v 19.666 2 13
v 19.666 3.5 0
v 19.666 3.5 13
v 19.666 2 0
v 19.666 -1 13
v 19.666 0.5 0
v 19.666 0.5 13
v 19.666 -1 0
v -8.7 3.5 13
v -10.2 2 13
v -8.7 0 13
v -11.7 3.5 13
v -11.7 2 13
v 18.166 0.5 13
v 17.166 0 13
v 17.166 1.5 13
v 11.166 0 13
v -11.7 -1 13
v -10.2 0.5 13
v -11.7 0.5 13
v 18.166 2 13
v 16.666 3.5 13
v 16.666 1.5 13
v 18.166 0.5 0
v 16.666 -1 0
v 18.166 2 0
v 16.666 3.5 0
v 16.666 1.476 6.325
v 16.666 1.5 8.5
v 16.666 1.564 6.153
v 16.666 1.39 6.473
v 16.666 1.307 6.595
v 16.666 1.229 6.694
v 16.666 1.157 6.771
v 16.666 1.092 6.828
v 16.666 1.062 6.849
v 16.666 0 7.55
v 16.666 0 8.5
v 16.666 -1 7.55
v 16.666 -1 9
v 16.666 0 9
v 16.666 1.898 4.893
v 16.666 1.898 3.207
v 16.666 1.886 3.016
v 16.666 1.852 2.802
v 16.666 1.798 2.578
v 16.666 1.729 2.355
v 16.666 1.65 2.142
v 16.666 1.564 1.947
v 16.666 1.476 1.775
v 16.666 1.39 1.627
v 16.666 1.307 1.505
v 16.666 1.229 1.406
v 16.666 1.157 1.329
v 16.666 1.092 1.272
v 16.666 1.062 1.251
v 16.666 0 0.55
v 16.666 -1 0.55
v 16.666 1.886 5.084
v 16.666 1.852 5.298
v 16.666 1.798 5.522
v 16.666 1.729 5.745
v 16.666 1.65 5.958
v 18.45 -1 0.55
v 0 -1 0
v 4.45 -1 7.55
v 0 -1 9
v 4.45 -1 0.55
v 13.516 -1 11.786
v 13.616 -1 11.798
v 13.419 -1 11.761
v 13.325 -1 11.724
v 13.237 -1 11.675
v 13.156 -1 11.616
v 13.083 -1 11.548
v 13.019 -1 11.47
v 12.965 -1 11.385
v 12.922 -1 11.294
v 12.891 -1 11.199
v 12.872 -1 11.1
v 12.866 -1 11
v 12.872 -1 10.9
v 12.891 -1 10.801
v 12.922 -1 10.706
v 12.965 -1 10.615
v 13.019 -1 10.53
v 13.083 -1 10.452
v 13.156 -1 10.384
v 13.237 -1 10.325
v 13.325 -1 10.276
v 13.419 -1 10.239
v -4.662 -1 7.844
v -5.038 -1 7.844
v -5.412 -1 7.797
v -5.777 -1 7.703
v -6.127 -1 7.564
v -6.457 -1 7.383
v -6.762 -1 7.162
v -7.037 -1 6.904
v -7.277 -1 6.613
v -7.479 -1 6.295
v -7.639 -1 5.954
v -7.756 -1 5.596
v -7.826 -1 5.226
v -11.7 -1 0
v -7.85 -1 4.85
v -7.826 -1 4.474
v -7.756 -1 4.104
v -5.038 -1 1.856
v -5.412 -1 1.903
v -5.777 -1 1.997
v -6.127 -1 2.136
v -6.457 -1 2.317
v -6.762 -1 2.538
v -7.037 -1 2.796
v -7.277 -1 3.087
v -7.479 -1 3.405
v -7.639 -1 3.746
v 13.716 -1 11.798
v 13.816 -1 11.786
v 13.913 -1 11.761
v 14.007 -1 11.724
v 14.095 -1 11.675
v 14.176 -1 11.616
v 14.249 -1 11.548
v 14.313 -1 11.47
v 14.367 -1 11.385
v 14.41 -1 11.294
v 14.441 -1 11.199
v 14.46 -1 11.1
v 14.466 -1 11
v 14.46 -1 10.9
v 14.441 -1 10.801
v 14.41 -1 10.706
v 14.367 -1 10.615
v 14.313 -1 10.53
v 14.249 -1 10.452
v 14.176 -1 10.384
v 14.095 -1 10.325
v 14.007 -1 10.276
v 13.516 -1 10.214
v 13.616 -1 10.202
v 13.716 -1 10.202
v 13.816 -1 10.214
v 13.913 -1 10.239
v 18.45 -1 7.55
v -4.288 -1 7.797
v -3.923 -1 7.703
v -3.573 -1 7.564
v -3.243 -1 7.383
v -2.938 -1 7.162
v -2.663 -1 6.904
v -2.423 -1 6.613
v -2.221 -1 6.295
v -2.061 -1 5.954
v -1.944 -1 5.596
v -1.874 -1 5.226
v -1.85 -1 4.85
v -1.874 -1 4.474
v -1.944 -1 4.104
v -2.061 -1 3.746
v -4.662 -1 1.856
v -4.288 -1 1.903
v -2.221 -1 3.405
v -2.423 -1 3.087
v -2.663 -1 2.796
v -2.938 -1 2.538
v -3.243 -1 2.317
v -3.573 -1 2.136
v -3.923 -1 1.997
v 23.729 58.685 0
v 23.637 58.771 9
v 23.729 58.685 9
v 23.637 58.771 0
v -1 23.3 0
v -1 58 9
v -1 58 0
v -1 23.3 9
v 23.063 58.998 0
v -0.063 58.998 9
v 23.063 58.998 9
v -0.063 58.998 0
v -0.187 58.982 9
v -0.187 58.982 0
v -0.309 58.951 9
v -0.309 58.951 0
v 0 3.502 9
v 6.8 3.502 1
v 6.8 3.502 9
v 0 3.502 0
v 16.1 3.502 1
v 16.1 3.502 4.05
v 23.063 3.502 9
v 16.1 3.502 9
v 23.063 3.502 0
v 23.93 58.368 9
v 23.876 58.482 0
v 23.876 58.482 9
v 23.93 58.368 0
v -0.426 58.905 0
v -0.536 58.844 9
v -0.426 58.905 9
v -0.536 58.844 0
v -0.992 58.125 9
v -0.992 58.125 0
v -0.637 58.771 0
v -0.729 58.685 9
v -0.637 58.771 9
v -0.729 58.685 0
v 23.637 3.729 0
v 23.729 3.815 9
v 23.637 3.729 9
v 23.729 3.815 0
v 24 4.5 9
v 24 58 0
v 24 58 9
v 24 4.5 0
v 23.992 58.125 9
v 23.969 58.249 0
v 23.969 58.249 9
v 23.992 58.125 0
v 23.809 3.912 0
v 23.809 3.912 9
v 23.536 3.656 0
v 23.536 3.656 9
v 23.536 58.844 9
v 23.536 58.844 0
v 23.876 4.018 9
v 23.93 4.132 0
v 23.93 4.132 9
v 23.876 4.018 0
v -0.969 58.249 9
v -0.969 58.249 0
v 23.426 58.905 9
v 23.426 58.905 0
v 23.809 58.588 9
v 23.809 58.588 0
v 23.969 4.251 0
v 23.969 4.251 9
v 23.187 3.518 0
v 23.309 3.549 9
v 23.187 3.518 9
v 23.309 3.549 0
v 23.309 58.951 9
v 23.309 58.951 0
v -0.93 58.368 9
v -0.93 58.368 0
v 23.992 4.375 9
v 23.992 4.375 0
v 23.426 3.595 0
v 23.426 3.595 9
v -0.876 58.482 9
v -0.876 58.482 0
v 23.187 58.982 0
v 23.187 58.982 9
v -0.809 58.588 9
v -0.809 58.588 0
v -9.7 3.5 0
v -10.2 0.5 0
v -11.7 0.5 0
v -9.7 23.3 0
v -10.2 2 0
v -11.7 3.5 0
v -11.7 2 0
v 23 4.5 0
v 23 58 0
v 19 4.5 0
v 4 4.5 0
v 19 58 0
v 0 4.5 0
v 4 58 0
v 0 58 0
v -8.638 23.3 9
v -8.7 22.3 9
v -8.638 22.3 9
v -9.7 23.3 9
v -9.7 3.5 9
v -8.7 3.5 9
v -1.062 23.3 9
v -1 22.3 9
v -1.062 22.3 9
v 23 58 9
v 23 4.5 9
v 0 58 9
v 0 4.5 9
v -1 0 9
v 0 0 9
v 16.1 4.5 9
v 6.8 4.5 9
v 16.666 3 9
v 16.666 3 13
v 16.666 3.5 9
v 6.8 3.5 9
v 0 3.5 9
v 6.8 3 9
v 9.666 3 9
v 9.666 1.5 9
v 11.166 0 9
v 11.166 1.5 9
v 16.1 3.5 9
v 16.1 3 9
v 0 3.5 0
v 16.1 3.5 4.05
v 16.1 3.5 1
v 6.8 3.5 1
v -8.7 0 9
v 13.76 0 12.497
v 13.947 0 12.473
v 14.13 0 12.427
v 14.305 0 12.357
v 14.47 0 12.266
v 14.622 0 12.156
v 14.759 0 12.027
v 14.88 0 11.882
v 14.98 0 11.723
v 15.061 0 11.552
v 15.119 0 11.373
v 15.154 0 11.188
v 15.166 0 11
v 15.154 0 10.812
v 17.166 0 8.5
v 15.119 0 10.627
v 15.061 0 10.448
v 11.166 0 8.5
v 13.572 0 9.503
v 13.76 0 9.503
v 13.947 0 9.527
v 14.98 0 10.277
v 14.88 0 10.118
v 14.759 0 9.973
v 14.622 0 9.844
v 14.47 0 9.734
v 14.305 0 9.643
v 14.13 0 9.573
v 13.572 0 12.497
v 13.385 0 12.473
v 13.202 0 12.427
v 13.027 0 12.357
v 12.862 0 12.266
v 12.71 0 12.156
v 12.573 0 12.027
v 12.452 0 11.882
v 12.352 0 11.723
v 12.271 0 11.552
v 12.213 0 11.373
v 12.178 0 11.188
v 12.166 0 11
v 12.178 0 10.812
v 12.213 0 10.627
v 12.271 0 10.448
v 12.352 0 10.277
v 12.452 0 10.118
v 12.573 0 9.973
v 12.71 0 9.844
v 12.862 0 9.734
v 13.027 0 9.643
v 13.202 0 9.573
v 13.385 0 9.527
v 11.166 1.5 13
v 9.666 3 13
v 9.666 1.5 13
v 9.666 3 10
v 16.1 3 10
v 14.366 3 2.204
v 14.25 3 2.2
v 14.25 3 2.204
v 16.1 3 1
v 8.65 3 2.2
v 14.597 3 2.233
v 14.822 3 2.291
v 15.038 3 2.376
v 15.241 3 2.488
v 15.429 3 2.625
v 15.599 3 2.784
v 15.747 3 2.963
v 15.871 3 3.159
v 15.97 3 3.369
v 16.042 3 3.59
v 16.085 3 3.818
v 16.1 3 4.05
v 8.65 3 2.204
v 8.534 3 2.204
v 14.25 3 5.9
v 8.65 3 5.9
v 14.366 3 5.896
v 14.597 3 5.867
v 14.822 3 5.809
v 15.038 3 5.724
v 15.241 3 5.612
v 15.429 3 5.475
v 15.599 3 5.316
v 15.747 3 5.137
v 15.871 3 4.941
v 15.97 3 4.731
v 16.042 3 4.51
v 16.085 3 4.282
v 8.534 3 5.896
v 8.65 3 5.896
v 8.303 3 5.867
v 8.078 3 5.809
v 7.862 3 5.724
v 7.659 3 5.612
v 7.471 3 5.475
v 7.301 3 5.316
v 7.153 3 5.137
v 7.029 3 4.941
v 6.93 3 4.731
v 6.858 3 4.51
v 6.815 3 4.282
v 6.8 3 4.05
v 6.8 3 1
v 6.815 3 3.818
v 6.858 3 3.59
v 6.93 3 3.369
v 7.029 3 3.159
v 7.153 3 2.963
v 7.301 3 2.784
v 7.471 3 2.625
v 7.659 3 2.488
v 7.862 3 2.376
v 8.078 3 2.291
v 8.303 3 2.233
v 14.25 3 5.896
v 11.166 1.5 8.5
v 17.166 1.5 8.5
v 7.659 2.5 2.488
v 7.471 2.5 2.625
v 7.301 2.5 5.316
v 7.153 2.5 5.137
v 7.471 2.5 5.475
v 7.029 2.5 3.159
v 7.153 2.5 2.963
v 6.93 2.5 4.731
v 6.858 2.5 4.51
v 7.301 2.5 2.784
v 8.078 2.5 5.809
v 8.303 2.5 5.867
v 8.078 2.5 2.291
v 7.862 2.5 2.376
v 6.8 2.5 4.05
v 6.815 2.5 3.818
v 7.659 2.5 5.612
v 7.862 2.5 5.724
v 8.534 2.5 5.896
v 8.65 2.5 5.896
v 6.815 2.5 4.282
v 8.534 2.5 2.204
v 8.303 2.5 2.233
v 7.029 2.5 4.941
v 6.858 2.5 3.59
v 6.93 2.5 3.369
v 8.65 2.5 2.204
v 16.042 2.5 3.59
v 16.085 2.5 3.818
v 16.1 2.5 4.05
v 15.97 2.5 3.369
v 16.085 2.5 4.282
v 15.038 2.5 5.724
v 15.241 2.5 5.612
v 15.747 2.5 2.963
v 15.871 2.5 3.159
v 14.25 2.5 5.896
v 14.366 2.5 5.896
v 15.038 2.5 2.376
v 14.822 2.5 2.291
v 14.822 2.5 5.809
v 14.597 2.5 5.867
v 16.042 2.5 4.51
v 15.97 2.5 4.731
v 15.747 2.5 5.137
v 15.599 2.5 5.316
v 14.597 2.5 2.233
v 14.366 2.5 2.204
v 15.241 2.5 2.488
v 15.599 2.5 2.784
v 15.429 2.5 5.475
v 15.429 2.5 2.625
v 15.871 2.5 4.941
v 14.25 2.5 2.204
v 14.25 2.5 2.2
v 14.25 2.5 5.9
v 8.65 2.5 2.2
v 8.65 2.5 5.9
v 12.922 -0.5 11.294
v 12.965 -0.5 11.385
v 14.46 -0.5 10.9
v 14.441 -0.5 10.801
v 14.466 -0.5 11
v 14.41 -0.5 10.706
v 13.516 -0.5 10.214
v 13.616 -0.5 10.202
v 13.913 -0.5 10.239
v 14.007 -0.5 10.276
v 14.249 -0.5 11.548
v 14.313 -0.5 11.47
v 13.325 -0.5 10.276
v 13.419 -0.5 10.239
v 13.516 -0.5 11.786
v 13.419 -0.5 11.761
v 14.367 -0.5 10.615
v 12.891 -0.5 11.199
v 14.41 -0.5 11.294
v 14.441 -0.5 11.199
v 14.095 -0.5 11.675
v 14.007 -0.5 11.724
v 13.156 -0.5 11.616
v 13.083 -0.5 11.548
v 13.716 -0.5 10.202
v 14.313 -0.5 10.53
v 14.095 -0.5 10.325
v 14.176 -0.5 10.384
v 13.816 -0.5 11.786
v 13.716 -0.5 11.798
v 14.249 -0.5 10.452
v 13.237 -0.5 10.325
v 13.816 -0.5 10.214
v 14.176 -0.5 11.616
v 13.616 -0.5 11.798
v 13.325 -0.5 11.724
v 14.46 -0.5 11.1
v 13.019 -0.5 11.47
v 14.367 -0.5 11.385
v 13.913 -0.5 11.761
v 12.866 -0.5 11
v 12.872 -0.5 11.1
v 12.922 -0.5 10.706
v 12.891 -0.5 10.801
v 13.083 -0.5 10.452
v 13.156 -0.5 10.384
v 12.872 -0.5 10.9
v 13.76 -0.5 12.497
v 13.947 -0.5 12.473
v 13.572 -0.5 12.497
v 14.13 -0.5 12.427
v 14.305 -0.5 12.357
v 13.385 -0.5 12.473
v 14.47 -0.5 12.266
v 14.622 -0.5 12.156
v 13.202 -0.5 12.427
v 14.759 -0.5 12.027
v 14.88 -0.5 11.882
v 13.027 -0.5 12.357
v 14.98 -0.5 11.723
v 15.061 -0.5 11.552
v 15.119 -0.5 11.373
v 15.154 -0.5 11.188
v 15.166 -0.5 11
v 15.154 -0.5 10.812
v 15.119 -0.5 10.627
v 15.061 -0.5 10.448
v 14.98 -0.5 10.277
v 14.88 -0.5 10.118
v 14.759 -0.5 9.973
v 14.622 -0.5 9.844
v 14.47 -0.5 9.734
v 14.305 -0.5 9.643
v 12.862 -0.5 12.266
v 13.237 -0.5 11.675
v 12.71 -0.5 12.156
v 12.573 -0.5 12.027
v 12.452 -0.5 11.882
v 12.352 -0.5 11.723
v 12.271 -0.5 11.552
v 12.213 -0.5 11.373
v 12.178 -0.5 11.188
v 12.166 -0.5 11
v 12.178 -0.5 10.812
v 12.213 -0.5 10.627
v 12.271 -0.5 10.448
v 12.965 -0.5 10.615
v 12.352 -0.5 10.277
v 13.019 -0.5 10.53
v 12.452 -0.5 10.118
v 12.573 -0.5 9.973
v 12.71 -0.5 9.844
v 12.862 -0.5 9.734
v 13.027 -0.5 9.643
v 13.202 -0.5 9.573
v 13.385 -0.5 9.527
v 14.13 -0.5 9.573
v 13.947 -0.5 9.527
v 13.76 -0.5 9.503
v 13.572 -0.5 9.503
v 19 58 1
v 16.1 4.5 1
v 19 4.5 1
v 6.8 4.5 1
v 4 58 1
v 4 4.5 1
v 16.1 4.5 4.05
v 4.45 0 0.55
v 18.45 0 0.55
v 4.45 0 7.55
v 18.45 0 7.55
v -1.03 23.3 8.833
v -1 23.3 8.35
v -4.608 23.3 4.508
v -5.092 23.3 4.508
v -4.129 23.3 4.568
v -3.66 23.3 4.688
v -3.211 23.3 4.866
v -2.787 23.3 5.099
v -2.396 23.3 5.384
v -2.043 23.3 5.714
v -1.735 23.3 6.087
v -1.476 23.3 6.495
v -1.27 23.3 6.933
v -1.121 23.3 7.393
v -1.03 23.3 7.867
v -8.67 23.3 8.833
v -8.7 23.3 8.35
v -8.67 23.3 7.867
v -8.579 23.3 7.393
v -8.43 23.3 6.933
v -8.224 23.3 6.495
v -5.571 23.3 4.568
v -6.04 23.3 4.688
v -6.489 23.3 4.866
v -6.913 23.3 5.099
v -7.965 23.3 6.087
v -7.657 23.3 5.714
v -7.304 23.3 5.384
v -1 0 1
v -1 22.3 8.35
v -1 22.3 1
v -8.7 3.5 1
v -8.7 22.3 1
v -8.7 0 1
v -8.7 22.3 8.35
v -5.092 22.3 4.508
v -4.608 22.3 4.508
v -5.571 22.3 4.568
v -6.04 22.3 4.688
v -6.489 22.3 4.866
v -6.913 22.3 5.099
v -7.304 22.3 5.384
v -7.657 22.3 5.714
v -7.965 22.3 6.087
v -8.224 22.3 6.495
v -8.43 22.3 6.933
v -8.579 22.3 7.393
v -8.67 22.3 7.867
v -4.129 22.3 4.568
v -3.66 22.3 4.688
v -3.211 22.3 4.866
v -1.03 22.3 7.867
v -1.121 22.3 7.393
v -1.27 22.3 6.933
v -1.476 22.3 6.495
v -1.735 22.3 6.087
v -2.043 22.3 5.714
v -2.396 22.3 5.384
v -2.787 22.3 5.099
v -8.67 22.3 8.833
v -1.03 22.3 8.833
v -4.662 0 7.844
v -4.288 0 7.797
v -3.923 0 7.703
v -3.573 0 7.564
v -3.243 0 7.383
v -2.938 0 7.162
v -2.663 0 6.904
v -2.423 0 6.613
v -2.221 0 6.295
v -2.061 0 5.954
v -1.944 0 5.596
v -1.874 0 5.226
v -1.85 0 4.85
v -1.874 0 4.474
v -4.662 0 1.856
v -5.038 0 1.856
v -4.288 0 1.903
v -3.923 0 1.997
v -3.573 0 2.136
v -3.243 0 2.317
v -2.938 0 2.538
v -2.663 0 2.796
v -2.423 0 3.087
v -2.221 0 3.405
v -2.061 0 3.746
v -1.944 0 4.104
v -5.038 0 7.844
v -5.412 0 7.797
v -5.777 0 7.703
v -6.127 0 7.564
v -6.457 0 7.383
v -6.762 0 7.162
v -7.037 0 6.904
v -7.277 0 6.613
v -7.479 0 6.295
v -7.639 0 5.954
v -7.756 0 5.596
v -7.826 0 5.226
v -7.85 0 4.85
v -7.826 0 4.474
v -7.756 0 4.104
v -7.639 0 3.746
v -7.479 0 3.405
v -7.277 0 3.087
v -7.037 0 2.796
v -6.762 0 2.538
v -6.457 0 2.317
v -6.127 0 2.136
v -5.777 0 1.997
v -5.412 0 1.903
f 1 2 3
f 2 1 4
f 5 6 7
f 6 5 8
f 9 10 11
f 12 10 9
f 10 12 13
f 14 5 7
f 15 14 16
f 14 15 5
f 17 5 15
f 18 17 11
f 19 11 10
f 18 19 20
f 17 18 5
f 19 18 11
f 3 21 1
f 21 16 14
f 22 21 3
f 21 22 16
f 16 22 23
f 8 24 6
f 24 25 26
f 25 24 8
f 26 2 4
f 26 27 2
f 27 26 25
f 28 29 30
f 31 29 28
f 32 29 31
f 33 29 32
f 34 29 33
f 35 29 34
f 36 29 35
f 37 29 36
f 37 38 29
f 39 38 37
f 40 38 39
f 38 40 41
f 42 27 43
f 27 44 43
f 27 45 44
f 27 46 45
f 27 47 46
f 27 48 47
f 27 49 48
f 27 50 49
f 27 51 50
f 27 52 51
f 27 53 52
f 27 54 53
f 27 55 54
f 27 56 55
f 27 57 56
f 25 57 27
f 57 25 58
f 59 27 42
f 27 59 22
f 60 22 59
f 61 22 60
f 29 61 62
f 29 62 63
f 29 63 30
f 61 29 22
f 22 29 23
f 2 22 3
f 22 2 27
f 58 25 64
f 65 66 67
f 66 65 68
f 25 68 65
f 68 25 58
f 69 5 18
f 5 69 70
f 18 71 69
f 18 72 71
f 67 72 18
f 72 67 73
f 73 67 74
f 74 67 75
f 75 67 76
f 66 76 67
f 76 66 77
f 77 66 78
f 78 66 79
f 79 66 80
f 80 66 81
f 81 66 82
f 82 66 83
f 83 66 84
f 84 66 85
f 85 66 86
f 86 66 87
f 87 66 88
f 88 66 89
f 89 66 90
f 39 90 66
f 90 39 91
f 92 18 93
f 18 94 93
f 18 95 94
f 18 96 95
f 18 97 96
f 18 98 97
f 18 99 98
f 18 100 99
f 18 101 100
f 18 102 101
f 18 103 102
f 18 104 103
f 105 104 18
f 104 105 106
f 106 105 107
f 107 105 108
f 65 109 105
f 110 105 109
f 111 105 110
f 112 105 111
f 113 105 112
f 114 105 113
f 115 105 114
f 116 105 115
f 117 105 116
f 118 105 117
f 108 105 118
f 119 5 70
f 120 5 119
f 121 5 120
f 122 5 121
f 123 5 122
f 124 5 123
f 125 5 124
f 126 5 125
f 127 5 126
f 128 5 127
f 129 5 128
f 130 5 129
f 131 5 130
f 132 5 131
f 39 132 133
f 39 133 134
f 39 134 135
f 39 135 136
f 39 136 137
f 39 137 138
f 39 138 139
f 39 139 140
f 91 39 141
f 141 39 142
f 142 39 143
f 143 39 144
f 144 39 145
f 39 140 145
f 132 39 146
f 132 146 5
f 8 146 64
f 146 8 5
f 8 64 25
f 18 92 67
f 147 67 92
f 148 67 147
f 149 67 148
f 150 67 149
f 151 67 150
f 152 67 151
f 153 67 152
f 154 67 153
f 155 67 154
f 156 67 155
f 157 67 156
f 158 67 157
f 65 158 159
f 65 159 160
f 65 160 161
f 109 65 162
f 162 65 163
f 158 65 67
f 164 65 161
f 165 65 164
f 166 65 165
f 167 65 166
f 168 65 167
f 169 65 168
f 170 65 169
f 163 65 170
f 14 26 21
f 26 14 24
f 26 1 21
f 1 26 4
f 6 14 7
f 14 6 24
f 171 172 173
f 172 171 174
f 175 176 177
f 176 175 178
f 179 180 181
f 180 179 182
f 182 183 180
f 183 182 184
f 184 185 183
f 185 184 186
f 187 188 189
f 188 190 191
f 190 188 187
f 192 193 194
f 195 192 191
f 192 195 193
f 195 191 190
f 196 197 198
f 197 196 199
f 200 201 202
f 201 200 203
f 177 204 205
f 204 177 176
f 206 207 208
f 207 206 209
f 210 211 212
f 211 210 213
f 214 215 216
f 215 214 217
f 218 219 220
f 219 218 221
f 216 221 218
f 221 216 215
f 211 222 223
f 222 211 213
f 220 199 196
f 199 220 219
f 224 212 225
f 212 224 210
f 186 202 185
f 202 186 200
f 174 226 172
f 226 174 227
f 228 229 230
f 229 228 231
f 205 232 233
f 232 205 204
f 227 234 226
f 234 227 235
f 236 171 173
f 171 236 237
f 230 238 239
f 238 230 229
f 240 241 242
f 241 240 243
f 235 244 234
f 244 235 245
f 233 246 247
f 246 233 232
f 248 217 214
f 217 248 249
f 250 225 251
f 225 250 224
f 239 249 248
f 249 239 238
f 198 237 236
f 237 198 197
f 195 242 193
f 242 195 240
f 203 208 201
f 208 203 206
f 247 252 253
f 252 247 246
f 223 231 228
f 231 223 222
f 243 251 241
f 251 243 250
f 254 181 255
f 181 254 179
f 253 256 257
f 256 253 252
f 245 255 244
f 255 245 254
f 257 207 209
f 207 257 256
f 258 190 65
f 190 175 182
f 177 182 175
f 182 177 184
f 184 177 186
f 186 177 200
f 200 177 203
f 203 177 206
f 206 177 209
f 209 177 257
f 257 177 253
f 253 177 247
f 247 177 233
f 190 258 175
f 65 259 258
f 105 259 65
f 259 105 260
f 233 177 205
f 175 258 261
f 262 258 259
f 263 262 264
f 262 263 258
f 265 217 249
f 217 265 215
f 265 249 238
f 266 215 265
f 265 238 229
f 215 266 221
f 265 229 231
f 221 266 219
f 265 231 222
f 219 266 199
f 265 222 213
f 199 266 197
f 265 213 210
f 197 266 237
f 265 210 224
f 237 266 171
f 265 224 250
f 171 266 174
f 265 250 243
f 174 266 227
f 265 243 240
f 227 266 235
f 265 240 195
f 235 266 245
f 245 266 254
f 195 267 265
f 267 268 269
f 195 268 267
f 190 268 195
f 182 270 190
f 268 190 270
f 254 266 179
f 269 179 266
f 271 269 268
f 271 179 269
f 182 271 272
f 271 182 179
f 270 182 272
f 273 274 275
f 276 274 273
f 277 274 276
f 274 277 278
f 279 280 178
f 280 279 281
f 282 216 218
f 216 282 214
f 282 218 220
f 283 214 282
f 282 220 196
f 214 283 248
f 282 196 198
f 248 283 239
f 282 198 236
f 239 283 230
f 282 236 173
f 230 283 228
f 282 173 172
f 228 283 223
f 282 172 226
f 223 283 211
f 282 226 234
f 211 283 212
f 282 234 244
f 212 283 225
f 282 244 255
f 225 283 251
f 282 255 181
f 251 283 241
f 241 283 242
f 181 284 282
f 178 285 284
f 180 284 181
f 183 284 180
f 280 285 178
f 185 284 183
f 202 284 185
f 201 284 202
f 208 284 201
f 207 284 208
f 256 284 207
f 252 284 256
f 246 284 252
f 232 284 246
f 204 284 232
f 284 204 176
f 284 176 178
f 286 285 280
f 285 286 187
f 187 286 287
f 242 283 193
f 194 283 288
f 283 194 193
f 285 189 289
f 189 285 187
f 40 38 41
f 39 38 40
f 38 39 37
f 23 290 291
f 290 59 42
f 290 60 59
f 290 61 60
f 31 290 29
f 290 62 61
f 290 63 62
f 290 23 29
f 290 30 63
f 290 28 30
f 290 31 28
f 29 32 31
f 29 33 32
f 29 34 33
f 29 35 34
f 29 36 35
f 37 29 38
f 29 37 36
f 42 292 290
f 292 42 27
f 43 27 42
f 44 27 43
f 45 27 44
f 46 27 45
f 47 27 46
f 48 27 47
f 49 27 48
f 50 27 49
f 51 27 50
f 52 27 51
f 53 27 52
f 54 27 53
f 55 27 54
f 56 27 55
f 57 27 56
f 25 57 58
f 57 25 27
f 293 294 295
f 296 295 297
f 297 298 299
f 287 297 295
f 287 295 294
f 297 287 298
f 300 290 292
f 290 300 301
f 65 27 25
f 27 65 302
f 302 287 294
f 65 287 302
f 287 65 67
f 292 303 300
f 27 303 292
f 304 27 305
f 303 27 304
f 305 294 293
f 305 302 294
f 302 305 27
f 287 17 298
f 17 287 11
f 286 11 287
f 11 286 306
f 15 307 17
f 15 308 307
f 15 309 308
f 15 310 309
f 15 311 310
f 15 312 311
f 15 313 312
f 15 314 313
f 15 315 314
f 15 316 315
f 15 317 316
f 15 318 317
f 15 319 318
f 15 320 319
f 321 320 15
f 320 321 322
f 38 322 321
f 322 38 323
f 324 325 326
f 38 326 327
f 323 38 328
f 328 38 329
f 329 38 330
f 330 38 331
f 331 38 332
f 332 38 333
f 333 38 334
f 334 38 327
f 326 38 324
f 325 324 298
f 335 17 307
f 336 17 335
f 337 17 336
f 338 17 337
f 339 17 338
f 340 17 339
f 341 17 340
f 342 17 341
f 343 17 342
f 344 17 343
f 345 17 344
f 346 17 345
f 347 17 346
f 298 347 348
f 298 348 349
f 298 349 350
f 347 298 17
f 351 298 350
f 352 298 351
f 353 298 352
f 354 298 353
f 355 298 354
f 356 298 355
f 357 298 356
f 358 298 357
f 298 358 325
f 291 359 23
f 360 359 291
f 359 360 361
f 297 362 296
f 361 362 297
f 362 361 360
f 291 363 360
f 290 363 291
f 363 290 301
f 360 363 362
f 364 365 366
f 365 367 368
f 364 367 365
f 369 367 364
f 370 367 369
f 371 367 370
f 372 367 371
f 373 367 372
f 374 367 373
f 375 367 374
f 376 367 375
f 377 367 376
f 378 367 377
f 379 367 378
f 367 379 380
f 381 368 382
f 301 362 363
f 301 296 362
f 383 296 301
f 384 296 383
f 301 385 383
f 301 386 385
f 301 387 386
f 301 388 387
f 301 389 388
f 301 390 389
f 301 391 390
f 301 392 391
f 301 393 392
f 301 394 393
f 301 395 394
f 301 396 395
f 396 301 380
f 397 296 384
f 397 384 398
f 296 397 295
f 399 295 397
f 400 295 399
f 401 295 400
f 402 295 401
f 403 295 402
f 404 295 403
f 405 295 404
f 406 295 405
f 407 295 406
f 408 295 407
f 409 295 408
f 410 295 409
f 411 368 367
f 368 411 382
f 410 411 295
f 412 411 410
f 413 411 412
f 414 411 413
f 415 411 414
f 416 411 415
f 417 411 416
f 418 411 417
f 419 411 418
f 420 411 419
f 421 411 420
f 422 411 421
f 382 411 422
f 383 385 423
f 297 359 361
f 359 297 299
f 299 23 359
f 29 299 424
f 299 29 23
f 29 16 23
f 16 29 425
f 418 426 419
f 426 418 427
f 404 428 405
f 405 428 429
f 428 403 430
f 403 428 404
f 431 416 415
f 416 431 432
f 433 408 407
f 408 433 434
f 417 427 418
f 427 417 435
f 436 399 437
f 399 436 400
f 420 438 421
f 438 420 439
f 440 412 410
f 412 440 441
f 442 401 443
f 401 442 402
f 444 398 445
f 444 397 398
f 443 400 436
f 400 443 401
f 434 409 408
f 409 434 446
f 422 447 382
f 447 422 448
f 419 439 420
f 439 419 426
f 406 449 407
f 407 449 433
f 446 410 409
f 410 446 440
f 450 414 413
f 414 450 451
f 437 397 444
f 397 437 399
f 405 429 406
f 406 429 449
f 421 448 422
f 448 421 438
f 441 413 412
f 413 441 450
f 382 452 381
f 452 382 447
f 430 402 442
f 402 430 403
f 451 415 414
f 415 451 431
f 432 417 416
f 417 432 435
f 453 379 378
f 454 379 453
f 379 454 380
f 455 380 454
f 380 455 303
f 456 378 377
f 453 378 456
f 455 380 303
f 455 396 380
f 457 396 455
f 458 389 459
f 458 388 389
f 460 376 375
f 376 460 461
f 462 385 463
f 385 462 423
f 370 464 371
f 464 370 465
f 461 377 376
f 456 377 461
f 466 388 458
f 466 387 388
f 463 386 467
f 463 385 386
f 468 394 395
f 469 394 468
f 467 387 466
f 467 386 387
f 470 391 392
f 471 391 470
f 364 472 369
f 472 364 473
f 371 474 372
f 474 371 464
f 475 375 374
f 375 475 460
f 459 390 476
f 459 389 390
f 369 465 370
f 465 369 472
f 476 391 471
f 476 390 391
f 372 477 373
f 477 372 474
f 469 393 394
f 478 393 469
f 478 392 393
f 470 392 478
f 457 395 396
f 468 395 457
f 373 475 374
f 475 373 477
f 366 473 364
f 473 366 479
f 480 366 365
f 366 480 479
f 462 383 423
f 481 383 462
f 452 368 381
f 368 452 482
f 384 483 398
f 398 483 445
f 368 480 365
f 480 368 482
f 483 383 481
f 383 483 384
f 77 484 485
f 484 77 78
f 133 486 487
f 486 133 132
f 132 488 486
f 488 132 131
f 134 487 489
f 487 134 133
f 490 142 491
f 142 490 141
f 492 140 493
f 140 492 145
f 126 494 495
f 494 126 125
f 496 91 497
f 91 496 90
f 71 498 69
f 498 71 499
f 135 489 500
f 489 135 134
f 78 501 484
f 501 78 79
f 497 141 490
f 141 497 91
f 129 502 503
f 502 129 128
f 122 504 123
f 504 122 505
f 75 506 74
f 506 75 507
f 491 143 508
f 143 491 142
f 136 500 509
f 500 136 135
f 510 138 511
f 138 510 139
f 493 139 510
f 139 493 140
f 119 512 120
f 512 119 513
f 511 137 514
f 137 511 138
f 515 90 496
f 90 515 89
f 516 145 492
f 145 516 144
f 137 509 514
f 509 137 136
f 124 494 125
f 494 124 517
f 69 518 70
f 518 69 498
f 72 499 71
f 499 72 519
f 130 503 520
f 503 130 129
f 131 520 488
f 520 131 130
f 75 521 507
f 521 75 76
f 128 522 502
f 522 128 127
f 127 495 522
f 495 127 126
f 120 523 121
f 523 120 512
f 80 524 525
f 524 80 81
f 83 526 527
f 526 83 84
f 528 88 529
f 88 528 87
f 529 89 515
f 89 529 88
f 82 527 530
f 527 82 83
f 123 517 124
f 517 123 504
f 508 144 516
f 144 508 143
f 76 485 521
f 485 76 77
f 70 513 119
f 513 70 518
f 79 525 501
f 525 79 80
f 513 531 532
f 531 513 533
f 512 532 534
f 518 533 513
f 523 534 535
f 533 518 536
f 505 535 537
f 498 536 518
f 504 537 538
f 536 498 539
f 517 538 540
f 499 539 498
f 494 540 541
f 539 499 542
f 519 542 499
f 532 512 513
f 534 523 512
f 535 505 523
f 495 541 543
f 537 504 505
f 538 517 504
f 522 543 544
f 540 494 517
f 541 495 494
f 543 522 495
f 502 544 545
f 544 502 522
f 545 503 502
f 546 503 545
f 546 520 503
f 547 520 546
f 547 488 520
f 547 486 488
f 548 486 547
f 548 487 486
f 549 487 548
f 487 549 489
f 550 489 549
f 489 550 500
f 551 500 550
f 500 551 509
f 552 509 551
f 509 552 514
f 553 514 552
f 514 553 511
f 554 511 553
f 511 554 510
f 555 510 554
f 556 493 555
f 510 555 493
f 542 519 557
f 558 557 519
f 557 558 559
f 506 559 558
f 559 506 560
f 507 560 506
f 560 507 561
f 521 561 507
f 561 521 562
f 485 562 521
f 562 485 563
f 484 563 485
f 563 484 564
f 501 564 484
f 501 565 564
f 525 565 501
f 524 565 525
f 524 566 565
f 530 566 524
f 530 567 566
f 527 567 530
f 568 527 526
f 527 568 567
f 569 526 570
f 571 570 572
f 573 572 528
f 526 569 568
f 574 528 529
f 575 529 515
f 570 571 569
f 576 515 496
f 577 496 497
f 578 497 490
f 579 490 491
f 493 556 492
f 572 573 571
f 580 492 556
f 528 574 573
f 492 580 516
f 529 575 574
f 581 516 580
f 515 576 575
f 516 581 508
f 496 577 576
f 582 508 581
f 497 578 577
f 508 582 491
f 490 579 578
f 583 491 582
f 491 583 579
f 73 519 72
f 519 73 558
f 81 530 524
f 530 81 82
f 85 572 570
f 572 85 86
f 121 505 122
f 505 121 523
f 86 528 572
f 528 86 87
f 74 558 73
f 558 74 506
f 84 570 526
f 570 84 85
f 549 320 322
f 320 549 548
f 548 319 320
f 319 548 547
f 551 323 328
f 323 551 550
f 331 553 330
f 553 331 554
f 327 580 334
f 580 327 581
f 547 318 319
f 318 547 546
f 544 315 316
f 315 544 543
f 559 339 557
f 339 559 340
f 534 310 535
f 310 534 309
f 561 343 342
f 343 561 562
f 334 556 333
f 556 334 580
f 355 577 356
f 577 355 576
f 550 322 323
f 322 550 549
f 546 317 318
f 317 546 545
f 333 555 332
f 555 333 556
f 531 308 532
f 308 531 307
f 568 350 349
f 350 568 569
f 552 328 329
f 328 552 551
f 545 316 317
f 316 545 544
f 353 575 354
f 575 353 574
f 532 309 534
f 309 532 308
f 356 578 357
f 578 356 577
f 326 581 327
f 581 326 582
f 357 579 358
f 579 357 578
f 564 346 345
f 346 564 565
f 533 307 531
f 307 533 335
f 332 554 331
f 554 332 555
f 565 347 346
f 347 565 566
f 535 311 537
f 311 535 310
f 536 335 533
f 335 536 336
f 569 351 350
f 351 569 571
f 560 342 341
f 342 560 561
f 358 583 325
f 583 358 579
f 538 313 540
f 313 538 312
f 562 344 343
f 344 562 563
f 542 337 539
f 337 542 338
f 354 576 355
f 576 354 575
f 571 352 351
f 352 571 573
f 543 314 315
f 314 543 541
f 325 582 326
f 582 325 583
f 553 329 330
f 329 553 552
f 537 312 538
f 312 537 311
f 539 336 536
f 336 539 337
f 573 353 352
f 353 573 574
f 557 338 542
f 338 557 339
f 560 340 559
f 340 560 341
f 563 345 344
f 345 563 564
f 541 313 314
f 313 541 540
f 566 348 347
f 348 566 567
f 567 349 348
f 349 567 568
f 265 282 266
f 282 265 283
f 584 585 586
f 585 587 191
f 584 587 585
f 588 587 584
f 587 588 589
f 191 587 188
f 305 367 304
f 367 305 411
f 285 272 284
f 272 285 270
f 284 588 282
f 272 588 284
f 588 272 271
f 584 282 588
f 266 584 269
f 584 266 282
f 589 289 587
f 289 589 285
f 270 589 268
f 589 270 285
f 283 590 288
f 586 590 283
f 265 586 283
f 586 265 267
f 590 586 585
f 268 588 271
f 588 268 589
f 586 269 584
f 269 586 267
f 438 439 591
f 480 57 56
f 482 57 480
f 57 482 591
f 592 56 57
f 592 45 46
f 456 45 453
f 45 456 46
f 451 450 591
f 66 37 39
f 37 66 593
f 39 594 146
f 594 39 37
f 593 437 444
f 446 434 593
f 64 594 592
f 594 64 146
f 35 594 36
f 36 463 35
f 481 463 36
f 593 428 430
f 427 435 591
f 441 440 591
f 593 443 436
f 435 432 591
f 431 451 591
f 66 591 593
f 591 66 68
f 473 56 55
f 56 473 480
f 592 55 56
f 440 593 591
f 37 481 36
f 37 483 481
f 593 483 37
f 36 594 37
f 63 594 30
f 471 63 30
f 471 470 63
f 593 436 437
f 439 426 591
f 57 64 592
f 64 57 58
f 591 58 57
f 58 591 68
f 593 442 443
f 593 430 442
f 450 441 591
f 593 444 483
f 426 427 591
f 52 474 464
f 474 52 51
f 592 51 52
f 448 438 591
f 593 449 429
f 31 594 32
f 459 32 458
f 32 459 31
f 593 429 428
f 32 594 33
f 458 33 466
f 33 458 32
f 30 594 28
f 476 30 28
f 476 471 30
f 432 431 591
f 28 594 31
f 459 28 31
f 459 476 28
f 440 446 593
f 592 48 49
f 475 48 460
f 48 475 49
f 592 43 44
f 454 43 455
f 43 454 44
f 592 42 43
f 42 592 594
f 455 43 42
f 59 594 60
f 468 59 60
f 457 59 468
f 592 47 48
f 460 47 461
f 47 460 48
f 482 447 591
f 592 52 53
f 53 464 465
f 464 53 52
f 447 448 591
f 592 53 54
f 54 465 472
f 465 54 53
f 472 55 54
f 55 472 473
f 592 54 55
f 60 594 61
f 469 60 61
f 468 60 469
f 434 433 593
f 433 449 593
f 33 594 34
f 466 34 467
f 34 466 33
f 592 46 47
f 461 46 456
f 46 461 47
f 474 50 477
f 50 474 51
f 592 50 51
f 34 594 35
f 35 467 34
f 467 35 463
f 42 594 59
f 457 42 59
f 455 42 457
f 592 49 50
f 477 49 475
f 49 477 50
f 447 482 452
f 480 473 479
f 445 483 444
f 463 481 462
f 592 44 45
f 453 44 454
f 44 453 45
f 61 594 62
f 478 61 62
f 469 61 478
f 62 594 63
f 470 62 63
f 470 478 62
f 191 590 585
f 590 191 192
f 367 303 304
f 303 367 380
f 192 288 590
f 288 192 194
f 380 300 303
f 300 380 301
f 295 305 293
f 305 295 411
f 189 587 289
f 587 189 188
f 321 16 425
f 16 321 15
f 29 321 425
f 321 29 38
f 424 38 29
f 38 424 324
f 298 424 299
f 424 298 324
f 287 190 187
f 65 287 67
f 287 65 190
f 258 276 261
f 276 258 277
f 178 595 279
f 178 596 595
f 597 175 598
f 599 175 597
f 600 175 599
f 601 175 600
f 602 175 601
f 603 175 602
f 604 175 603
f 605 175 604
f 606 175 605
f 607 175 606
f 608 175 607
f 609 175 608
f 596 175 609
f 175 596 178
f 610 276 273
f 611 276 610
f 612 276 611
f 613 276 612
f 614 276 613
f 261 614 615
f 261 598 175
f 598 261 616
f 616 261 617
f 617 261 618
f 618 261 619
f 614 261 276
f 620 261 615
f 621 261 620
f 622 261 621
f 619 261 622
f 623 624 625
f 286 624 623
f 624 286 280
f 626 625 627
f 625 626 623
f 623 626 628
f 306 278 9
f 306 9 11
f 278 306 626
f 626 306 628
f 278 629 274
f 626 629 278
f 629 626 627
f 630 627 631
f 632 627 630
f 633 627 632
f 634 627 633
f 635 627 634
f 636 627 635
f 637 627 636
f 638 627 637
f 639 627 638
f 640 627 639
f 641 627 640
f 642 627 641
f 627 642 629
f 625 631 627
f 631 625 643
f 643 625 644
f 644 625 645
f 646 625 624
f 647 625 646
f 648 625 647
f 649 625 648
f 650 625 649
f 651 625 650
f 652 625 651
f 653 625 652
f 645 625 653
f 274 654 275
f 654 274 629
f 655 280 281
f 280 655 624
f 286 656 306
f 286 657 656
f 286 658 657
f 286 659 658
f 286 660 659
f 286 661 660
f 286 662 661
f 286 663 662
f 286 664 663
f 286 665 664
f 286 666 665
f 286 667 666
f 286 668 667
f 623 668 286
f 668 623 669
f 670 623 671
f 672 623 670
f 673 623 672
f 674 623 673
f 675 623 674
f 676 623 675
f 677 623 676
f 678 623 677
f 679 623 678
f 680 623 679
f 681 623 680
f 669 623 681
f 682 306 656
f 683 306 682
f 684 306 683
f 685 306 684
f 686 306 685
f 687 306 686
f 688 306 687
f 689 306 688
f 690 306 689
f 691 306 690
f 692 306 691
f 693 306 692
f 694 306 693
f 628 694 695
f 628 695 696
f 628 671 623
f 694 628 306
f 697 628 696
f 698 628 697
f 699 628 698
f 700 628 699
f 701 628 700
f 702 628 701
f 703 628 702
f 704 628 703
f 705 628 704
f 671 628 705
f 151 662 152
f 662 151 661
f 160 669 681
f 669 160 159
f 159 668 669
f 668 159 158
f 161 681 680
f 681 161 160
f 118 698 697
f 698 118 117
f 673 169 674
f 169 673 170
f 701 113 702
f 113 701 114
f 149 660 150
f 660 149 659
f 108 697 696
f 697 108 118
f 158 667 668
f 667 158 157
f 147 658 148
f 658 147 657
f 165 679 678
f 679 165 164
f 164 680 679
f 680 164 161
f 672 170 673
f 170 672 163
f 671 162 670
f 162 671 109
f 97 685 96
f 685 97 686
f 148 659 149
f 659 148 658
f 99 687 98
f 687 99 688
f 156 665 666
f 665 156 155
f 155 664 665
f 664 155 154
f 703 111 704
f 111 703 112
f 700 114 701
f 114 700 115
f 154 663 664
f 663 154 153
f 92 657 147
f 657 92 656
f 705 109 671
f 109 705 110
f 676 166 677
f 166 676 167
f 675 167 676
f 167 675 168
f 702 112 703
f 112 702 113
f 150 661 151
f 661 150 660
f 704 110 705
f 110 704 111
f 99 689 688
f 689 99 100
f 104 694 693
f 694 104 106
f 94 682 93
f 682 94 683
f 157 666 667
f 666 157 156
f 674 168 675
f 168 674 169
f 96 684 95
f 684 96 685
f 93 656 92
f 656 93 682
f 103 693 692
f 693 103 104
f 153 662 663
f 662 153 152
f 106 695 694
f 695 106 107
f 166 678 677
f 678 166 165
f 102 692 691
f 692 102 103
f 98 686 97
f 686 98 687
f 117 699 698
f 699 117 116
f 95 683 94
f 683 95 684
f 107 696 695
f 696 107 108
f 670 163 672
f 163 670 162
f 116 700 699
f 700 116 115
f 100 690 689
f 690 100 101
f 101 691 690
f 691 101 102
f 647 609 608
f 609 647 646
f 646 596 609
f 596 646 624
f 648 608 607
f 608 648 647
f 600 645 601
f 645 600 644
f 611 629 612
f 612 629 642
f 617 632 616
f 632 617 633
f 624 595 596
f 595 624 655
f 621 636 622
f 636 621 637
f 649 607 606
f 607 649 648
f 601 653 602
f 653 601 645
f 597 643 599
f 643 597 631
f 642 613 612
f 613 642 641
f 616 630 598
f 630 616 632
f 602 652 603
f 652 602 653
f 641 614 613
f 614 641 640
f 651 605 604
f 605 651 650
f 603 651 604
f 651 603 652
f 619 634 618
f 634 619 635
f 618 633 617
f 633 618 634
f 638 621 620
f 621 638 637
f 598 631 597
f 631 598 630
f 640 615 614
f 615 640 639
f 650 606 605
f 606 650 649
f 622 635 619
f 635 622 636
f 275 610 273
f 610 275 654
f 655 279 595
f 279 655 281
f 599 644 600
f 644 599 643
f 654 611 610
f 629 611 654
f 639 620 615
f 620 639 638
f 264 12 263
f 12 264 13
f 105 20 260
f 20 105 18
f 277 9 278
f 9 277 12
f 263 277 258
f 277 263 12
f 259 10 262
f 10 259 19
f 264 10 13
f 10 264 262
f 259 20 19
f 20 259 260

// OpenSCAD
// microcontroller dimension
controllerWidth = 23;
controllerLen = 53.5;
controllerHeight = 1;

buttonAdditionalHeight = 4;
controllerBoxHeight = 9;
controllerWallWidth = 1;
controllerBottomHeight = 1;

//usb hole
usbHoleTopOffset = 2.2;
usbHoleHeight = 3.7;
usbHoleWidth = usbHoleHeight + 5.6;

// trrs
trrsDiameter = 6; // real size 5.8
trrsLen1 = 4;
trrsLen2 = 11.8;
trrsContactsLen = 6.5;
trrsOutterDiameter = 7.7;

//
controllerWiringHoleWidth = 4;
roundCornerHeight = 1;
roundCornerRadius = 1;

//bracing
bracingWidth = 1.5;
bracingOuterSize = 31.366;

//button
buttonDiameter = 3;
buttonClickDiameter = 1.6;
buttonHeight = 5.2;
buttonWidth = 6;
buttonDepth = 1.5;
 
boxHeight = controllerBoxHeight + buttonAdditionalHeight;

module trrs() {
    color("green")
    translate([-trrsOutterDiameter/2 - controllerWallWidth, 0, trrsOutterDiameter/2 + controllerBottomHeight])
    rotate([-90,0,00]) {
        translate([0, 0, -trrsLen1]) {
            cylinder(trrsLen1, trrsDiameter/2, trrsDiameter/2, $fn=50);
            translate([0, 0, trrsLen1]) {
                cylinder(trrsLen2, trrsOutterDiameter/2, trrsOutterDiameter/2, $fn=50);
                contactsDiameter = trrsOutterDiameter - 2;
                translate([0,0, trrsLen2]) cylinder(trrsContactsLen, contactsDiameter/2, contactsDiameter/2, $fn=50);
            }
        }
    } 
}

module controllerBox() {
    translate([0, 3*bracingWidth, 0])
    difference() {
        union(){
            minkowski() {
                cube([controllerWidth,  controllerLen, controllerBoxHeight -      roundCornerHeight]);
                cylinder(roundCornerHeight, roundCornerRadius, roundCornerRadius, $fn=50);
            }
           
            //usb additional wall
            leftOffset = -trrsOutterDiameter - controllerWallWidth - bracingWidth *2;
            width = leftOffset + bracingOuterSize - bracingWidth *2;
            translate([0,-controllerWallWidth - bracingWidth * 3, 0])
            cube([width, bracingWidth *3, controllerBoxHeight]);
            
            //top wall
            translate([leftOffset, -bracingWidth *3 - controllerWallWidth, controllerBoxHeight])
            cube([bracingOuterSize, controllerWallWidth, (boxHeight- controllerBoxHeight)]);
            
            //button holder
            holderWidth = buttonWidth + 1;
            translate([leftOffset + bracingOuterSize - bracingWidth * 2 - holderWidth, - bracingWidth * 3 + buttonDepth , controllerBoxHeight])
            cube([holderWidth, buttonDepth, buttonAdditionalHeight]);
            
             //left
            translate([-trrsOutterDiameter - controllerWallWidth - bracingWidth *2, -controllerWallWidth -3*bracingWidth, 0]) {
           
                //rigth
                translate([bracingOuterSize - bracingWidth *2, 0, 0])
                difference() {
                    cube([bracingWidth *2, bracingWidth*3, boxHeight]);
                    translate([bracingWidth, bracingWidth, 0])
                    cube([bracingWidth, bracingWidth, boxHeight]);
                }
            }
        }
        // Microcontroller hole
        translate([0,0, controllerBottomHeight])
    cube([controllerWidth,  controllerLen, boxHeight]);
        
        // Right wiring hole
        translate([0, 0, -0.5 ]) cube([controllerWiringHoleWidth, controllerLen, controllerBottomHeight + 0.5]);
        
        // Left wiring hole
        translate([controllerWidth - controllerWiringHoleWidth, 0, -0.5 ]) cube([controllerWiringHoleWidth, controllerLen, controllerBottomHeight + 0.5]);
        
        //usb hole
        translate([controllerWidth/2 - usbHoleHeight/2 - controllerWallWidth, -controllerWallWidth - 3*bracingWidth, usbHoleTopOffset + usbHoleHeight/2])
        rotate([-90,0,00]) {
            cylinder(10, usbHoleHeight/2, usbHoleHeight/2, $fn=50);
            translate([5.6,0,0]) cylinder(10, usbHoleHeight/2, usbHoleHeight/2, $fn=50);
            translate([0, -usbHoleHeight/2 ,0]) cube([5.6, usbHoleHeight, 10]);
        } 
        
        //usb hole entry
        outerHoleWidth = 14;
        translate([controllerWidth/2 - usbHoleHeight/2 - controllerWallWidth, -controllerWallWidth - 3*bracingWidth, usbHoleTopOffset + usbHoleHeight/2])
         rotate([-90, 0, 0]) {
             hull(){
                 union(){
                    cylinder(3*bracingWidth - controllerWallWidth, usbHoleHeight/2, usbHoleHeight/2, $fn=50);
                    translate([5.6,0,0]) cylinder( 3*bracingWidth - controllerWallWidth, usbHoleHeight/2, usbHoleHeight/2, $fn=50);
                    translate([0, -usbHoleHeight/2 ,0]) cube([5.6, usbHoleHeight, 3*bracingWidth - controllerWallWidth]);
                 }
                 translate([-usbHoleHeight/2 -(outerHoleWidth - usbHoleWidth)/2,- outerHoleWidth/4,0]) cube([outerHoleWidth, outerHoleWidth/2, 1]);
             }
         }
       
        //usb offset
        translate([controllerWidth/2 - usbHoleHeight - controllerWallWidth, -bracingWidth, controllerWallWidth])
        cube([5.6 + usbHoleHeight, bracingWidth, controllerBoxHeight]);
        
        buttonBottomOffset = 0.5;
        //switcher button hole
        leftOffset = -trrsOutterDiameter - controllerWallWidth - bracingWidth *2;
        translate([leftOffset + bracingOuterSize -  bracingWidth * 3 - (buttonWidth - buttonDiameter)/2,  -  bracingWidth * 3 - controllerWallWidth,  buttonDiameter/2 + controllerBoxHeight + buttonBottomOffset])
        rotate([-90, 0, 0]) {
            cylinder(controllerWallWidth/2, buttonClickDiameter/2, buttonClickDiameter/2, $fn = 50);
            translate([0, 0, controllerWallWidth/2]) cylinder(controllerWallWidth/2, buttonDiameter/2, buttonDiameter/2, $fn = 50);
        }
        
        //switcher case hole
        translate([leftOffset + bracingOuterSize -  bracingWidth * 3 - buttonWidth/2 - controllerWallWidth, -  bracingWidth * 3, controllerBoxHeight - controllerWallWidth + buttonBottomOffset])
        cube([buttonWidth, buttonDepth, buttonHeight]);
    }
}

module trrsBox() {
  
    translate([-trrsOutterDiameter - 2 * controllerWallWidth , - controllerWallWidth, 0])
    difference() {
        trrsLen = trrsLen2 + trrsContactsLen + 4;
        cube([trrsOutterDiameter + 2*controllerWallWidth, trrsLen + 2*controllerWallWidth, controllerBoxHeight]);

        // trrs box hole
        translate([controllerWallWidth, controllerWallWidth, controllerBottomHeight])
    cube([trrsOutterDiameter,  trrsLen, controllerBoxHeight]);
     
        // trrs hole
        translate([trrsOutterDiameter/2 + controllerWallWidth, 0, trrsOutterDiameter/2 + controllerBottomHeight])
    rotate([-90,0,00]) {
        translate([0, 0, -trrsLen1 + controllerWallWidth]) {
            cylinder(trrsLen1, trrsDiameter/2, trrsDiameter/2, $fn=50);
            }
        } 
         //back hole
        rotate([-90,0,00]) {
            translate([trrsOutterDiameter/2 + controllerWallWidth, -trrsOutterDiameter/2 - controllerBoxHeight/2 ,trrsLen + controllerWallWidth])
        cylinder(controllerWallWidth, trrsOutterDiameter/2, trrsOutterDiameter/2, $fn=50);
        }
    }
}

module bracingLeft() {
    //left
    translate([-trrsOutterDiameter - controllerWallWidth - bracingWidth *2, -controllerWallWidth , 0]) {
        color("brown")
        difference() {
            cube([bracingWidth *2, bracingWidth*3, boxHeight]);
             translate([0, bracingWidth, 0])
            cube([bracingWidth, bracingWidth, boxHeight]);
        }
    }
}

controllerBox();
trrsBox();
//trrs();
bracingLeft();
